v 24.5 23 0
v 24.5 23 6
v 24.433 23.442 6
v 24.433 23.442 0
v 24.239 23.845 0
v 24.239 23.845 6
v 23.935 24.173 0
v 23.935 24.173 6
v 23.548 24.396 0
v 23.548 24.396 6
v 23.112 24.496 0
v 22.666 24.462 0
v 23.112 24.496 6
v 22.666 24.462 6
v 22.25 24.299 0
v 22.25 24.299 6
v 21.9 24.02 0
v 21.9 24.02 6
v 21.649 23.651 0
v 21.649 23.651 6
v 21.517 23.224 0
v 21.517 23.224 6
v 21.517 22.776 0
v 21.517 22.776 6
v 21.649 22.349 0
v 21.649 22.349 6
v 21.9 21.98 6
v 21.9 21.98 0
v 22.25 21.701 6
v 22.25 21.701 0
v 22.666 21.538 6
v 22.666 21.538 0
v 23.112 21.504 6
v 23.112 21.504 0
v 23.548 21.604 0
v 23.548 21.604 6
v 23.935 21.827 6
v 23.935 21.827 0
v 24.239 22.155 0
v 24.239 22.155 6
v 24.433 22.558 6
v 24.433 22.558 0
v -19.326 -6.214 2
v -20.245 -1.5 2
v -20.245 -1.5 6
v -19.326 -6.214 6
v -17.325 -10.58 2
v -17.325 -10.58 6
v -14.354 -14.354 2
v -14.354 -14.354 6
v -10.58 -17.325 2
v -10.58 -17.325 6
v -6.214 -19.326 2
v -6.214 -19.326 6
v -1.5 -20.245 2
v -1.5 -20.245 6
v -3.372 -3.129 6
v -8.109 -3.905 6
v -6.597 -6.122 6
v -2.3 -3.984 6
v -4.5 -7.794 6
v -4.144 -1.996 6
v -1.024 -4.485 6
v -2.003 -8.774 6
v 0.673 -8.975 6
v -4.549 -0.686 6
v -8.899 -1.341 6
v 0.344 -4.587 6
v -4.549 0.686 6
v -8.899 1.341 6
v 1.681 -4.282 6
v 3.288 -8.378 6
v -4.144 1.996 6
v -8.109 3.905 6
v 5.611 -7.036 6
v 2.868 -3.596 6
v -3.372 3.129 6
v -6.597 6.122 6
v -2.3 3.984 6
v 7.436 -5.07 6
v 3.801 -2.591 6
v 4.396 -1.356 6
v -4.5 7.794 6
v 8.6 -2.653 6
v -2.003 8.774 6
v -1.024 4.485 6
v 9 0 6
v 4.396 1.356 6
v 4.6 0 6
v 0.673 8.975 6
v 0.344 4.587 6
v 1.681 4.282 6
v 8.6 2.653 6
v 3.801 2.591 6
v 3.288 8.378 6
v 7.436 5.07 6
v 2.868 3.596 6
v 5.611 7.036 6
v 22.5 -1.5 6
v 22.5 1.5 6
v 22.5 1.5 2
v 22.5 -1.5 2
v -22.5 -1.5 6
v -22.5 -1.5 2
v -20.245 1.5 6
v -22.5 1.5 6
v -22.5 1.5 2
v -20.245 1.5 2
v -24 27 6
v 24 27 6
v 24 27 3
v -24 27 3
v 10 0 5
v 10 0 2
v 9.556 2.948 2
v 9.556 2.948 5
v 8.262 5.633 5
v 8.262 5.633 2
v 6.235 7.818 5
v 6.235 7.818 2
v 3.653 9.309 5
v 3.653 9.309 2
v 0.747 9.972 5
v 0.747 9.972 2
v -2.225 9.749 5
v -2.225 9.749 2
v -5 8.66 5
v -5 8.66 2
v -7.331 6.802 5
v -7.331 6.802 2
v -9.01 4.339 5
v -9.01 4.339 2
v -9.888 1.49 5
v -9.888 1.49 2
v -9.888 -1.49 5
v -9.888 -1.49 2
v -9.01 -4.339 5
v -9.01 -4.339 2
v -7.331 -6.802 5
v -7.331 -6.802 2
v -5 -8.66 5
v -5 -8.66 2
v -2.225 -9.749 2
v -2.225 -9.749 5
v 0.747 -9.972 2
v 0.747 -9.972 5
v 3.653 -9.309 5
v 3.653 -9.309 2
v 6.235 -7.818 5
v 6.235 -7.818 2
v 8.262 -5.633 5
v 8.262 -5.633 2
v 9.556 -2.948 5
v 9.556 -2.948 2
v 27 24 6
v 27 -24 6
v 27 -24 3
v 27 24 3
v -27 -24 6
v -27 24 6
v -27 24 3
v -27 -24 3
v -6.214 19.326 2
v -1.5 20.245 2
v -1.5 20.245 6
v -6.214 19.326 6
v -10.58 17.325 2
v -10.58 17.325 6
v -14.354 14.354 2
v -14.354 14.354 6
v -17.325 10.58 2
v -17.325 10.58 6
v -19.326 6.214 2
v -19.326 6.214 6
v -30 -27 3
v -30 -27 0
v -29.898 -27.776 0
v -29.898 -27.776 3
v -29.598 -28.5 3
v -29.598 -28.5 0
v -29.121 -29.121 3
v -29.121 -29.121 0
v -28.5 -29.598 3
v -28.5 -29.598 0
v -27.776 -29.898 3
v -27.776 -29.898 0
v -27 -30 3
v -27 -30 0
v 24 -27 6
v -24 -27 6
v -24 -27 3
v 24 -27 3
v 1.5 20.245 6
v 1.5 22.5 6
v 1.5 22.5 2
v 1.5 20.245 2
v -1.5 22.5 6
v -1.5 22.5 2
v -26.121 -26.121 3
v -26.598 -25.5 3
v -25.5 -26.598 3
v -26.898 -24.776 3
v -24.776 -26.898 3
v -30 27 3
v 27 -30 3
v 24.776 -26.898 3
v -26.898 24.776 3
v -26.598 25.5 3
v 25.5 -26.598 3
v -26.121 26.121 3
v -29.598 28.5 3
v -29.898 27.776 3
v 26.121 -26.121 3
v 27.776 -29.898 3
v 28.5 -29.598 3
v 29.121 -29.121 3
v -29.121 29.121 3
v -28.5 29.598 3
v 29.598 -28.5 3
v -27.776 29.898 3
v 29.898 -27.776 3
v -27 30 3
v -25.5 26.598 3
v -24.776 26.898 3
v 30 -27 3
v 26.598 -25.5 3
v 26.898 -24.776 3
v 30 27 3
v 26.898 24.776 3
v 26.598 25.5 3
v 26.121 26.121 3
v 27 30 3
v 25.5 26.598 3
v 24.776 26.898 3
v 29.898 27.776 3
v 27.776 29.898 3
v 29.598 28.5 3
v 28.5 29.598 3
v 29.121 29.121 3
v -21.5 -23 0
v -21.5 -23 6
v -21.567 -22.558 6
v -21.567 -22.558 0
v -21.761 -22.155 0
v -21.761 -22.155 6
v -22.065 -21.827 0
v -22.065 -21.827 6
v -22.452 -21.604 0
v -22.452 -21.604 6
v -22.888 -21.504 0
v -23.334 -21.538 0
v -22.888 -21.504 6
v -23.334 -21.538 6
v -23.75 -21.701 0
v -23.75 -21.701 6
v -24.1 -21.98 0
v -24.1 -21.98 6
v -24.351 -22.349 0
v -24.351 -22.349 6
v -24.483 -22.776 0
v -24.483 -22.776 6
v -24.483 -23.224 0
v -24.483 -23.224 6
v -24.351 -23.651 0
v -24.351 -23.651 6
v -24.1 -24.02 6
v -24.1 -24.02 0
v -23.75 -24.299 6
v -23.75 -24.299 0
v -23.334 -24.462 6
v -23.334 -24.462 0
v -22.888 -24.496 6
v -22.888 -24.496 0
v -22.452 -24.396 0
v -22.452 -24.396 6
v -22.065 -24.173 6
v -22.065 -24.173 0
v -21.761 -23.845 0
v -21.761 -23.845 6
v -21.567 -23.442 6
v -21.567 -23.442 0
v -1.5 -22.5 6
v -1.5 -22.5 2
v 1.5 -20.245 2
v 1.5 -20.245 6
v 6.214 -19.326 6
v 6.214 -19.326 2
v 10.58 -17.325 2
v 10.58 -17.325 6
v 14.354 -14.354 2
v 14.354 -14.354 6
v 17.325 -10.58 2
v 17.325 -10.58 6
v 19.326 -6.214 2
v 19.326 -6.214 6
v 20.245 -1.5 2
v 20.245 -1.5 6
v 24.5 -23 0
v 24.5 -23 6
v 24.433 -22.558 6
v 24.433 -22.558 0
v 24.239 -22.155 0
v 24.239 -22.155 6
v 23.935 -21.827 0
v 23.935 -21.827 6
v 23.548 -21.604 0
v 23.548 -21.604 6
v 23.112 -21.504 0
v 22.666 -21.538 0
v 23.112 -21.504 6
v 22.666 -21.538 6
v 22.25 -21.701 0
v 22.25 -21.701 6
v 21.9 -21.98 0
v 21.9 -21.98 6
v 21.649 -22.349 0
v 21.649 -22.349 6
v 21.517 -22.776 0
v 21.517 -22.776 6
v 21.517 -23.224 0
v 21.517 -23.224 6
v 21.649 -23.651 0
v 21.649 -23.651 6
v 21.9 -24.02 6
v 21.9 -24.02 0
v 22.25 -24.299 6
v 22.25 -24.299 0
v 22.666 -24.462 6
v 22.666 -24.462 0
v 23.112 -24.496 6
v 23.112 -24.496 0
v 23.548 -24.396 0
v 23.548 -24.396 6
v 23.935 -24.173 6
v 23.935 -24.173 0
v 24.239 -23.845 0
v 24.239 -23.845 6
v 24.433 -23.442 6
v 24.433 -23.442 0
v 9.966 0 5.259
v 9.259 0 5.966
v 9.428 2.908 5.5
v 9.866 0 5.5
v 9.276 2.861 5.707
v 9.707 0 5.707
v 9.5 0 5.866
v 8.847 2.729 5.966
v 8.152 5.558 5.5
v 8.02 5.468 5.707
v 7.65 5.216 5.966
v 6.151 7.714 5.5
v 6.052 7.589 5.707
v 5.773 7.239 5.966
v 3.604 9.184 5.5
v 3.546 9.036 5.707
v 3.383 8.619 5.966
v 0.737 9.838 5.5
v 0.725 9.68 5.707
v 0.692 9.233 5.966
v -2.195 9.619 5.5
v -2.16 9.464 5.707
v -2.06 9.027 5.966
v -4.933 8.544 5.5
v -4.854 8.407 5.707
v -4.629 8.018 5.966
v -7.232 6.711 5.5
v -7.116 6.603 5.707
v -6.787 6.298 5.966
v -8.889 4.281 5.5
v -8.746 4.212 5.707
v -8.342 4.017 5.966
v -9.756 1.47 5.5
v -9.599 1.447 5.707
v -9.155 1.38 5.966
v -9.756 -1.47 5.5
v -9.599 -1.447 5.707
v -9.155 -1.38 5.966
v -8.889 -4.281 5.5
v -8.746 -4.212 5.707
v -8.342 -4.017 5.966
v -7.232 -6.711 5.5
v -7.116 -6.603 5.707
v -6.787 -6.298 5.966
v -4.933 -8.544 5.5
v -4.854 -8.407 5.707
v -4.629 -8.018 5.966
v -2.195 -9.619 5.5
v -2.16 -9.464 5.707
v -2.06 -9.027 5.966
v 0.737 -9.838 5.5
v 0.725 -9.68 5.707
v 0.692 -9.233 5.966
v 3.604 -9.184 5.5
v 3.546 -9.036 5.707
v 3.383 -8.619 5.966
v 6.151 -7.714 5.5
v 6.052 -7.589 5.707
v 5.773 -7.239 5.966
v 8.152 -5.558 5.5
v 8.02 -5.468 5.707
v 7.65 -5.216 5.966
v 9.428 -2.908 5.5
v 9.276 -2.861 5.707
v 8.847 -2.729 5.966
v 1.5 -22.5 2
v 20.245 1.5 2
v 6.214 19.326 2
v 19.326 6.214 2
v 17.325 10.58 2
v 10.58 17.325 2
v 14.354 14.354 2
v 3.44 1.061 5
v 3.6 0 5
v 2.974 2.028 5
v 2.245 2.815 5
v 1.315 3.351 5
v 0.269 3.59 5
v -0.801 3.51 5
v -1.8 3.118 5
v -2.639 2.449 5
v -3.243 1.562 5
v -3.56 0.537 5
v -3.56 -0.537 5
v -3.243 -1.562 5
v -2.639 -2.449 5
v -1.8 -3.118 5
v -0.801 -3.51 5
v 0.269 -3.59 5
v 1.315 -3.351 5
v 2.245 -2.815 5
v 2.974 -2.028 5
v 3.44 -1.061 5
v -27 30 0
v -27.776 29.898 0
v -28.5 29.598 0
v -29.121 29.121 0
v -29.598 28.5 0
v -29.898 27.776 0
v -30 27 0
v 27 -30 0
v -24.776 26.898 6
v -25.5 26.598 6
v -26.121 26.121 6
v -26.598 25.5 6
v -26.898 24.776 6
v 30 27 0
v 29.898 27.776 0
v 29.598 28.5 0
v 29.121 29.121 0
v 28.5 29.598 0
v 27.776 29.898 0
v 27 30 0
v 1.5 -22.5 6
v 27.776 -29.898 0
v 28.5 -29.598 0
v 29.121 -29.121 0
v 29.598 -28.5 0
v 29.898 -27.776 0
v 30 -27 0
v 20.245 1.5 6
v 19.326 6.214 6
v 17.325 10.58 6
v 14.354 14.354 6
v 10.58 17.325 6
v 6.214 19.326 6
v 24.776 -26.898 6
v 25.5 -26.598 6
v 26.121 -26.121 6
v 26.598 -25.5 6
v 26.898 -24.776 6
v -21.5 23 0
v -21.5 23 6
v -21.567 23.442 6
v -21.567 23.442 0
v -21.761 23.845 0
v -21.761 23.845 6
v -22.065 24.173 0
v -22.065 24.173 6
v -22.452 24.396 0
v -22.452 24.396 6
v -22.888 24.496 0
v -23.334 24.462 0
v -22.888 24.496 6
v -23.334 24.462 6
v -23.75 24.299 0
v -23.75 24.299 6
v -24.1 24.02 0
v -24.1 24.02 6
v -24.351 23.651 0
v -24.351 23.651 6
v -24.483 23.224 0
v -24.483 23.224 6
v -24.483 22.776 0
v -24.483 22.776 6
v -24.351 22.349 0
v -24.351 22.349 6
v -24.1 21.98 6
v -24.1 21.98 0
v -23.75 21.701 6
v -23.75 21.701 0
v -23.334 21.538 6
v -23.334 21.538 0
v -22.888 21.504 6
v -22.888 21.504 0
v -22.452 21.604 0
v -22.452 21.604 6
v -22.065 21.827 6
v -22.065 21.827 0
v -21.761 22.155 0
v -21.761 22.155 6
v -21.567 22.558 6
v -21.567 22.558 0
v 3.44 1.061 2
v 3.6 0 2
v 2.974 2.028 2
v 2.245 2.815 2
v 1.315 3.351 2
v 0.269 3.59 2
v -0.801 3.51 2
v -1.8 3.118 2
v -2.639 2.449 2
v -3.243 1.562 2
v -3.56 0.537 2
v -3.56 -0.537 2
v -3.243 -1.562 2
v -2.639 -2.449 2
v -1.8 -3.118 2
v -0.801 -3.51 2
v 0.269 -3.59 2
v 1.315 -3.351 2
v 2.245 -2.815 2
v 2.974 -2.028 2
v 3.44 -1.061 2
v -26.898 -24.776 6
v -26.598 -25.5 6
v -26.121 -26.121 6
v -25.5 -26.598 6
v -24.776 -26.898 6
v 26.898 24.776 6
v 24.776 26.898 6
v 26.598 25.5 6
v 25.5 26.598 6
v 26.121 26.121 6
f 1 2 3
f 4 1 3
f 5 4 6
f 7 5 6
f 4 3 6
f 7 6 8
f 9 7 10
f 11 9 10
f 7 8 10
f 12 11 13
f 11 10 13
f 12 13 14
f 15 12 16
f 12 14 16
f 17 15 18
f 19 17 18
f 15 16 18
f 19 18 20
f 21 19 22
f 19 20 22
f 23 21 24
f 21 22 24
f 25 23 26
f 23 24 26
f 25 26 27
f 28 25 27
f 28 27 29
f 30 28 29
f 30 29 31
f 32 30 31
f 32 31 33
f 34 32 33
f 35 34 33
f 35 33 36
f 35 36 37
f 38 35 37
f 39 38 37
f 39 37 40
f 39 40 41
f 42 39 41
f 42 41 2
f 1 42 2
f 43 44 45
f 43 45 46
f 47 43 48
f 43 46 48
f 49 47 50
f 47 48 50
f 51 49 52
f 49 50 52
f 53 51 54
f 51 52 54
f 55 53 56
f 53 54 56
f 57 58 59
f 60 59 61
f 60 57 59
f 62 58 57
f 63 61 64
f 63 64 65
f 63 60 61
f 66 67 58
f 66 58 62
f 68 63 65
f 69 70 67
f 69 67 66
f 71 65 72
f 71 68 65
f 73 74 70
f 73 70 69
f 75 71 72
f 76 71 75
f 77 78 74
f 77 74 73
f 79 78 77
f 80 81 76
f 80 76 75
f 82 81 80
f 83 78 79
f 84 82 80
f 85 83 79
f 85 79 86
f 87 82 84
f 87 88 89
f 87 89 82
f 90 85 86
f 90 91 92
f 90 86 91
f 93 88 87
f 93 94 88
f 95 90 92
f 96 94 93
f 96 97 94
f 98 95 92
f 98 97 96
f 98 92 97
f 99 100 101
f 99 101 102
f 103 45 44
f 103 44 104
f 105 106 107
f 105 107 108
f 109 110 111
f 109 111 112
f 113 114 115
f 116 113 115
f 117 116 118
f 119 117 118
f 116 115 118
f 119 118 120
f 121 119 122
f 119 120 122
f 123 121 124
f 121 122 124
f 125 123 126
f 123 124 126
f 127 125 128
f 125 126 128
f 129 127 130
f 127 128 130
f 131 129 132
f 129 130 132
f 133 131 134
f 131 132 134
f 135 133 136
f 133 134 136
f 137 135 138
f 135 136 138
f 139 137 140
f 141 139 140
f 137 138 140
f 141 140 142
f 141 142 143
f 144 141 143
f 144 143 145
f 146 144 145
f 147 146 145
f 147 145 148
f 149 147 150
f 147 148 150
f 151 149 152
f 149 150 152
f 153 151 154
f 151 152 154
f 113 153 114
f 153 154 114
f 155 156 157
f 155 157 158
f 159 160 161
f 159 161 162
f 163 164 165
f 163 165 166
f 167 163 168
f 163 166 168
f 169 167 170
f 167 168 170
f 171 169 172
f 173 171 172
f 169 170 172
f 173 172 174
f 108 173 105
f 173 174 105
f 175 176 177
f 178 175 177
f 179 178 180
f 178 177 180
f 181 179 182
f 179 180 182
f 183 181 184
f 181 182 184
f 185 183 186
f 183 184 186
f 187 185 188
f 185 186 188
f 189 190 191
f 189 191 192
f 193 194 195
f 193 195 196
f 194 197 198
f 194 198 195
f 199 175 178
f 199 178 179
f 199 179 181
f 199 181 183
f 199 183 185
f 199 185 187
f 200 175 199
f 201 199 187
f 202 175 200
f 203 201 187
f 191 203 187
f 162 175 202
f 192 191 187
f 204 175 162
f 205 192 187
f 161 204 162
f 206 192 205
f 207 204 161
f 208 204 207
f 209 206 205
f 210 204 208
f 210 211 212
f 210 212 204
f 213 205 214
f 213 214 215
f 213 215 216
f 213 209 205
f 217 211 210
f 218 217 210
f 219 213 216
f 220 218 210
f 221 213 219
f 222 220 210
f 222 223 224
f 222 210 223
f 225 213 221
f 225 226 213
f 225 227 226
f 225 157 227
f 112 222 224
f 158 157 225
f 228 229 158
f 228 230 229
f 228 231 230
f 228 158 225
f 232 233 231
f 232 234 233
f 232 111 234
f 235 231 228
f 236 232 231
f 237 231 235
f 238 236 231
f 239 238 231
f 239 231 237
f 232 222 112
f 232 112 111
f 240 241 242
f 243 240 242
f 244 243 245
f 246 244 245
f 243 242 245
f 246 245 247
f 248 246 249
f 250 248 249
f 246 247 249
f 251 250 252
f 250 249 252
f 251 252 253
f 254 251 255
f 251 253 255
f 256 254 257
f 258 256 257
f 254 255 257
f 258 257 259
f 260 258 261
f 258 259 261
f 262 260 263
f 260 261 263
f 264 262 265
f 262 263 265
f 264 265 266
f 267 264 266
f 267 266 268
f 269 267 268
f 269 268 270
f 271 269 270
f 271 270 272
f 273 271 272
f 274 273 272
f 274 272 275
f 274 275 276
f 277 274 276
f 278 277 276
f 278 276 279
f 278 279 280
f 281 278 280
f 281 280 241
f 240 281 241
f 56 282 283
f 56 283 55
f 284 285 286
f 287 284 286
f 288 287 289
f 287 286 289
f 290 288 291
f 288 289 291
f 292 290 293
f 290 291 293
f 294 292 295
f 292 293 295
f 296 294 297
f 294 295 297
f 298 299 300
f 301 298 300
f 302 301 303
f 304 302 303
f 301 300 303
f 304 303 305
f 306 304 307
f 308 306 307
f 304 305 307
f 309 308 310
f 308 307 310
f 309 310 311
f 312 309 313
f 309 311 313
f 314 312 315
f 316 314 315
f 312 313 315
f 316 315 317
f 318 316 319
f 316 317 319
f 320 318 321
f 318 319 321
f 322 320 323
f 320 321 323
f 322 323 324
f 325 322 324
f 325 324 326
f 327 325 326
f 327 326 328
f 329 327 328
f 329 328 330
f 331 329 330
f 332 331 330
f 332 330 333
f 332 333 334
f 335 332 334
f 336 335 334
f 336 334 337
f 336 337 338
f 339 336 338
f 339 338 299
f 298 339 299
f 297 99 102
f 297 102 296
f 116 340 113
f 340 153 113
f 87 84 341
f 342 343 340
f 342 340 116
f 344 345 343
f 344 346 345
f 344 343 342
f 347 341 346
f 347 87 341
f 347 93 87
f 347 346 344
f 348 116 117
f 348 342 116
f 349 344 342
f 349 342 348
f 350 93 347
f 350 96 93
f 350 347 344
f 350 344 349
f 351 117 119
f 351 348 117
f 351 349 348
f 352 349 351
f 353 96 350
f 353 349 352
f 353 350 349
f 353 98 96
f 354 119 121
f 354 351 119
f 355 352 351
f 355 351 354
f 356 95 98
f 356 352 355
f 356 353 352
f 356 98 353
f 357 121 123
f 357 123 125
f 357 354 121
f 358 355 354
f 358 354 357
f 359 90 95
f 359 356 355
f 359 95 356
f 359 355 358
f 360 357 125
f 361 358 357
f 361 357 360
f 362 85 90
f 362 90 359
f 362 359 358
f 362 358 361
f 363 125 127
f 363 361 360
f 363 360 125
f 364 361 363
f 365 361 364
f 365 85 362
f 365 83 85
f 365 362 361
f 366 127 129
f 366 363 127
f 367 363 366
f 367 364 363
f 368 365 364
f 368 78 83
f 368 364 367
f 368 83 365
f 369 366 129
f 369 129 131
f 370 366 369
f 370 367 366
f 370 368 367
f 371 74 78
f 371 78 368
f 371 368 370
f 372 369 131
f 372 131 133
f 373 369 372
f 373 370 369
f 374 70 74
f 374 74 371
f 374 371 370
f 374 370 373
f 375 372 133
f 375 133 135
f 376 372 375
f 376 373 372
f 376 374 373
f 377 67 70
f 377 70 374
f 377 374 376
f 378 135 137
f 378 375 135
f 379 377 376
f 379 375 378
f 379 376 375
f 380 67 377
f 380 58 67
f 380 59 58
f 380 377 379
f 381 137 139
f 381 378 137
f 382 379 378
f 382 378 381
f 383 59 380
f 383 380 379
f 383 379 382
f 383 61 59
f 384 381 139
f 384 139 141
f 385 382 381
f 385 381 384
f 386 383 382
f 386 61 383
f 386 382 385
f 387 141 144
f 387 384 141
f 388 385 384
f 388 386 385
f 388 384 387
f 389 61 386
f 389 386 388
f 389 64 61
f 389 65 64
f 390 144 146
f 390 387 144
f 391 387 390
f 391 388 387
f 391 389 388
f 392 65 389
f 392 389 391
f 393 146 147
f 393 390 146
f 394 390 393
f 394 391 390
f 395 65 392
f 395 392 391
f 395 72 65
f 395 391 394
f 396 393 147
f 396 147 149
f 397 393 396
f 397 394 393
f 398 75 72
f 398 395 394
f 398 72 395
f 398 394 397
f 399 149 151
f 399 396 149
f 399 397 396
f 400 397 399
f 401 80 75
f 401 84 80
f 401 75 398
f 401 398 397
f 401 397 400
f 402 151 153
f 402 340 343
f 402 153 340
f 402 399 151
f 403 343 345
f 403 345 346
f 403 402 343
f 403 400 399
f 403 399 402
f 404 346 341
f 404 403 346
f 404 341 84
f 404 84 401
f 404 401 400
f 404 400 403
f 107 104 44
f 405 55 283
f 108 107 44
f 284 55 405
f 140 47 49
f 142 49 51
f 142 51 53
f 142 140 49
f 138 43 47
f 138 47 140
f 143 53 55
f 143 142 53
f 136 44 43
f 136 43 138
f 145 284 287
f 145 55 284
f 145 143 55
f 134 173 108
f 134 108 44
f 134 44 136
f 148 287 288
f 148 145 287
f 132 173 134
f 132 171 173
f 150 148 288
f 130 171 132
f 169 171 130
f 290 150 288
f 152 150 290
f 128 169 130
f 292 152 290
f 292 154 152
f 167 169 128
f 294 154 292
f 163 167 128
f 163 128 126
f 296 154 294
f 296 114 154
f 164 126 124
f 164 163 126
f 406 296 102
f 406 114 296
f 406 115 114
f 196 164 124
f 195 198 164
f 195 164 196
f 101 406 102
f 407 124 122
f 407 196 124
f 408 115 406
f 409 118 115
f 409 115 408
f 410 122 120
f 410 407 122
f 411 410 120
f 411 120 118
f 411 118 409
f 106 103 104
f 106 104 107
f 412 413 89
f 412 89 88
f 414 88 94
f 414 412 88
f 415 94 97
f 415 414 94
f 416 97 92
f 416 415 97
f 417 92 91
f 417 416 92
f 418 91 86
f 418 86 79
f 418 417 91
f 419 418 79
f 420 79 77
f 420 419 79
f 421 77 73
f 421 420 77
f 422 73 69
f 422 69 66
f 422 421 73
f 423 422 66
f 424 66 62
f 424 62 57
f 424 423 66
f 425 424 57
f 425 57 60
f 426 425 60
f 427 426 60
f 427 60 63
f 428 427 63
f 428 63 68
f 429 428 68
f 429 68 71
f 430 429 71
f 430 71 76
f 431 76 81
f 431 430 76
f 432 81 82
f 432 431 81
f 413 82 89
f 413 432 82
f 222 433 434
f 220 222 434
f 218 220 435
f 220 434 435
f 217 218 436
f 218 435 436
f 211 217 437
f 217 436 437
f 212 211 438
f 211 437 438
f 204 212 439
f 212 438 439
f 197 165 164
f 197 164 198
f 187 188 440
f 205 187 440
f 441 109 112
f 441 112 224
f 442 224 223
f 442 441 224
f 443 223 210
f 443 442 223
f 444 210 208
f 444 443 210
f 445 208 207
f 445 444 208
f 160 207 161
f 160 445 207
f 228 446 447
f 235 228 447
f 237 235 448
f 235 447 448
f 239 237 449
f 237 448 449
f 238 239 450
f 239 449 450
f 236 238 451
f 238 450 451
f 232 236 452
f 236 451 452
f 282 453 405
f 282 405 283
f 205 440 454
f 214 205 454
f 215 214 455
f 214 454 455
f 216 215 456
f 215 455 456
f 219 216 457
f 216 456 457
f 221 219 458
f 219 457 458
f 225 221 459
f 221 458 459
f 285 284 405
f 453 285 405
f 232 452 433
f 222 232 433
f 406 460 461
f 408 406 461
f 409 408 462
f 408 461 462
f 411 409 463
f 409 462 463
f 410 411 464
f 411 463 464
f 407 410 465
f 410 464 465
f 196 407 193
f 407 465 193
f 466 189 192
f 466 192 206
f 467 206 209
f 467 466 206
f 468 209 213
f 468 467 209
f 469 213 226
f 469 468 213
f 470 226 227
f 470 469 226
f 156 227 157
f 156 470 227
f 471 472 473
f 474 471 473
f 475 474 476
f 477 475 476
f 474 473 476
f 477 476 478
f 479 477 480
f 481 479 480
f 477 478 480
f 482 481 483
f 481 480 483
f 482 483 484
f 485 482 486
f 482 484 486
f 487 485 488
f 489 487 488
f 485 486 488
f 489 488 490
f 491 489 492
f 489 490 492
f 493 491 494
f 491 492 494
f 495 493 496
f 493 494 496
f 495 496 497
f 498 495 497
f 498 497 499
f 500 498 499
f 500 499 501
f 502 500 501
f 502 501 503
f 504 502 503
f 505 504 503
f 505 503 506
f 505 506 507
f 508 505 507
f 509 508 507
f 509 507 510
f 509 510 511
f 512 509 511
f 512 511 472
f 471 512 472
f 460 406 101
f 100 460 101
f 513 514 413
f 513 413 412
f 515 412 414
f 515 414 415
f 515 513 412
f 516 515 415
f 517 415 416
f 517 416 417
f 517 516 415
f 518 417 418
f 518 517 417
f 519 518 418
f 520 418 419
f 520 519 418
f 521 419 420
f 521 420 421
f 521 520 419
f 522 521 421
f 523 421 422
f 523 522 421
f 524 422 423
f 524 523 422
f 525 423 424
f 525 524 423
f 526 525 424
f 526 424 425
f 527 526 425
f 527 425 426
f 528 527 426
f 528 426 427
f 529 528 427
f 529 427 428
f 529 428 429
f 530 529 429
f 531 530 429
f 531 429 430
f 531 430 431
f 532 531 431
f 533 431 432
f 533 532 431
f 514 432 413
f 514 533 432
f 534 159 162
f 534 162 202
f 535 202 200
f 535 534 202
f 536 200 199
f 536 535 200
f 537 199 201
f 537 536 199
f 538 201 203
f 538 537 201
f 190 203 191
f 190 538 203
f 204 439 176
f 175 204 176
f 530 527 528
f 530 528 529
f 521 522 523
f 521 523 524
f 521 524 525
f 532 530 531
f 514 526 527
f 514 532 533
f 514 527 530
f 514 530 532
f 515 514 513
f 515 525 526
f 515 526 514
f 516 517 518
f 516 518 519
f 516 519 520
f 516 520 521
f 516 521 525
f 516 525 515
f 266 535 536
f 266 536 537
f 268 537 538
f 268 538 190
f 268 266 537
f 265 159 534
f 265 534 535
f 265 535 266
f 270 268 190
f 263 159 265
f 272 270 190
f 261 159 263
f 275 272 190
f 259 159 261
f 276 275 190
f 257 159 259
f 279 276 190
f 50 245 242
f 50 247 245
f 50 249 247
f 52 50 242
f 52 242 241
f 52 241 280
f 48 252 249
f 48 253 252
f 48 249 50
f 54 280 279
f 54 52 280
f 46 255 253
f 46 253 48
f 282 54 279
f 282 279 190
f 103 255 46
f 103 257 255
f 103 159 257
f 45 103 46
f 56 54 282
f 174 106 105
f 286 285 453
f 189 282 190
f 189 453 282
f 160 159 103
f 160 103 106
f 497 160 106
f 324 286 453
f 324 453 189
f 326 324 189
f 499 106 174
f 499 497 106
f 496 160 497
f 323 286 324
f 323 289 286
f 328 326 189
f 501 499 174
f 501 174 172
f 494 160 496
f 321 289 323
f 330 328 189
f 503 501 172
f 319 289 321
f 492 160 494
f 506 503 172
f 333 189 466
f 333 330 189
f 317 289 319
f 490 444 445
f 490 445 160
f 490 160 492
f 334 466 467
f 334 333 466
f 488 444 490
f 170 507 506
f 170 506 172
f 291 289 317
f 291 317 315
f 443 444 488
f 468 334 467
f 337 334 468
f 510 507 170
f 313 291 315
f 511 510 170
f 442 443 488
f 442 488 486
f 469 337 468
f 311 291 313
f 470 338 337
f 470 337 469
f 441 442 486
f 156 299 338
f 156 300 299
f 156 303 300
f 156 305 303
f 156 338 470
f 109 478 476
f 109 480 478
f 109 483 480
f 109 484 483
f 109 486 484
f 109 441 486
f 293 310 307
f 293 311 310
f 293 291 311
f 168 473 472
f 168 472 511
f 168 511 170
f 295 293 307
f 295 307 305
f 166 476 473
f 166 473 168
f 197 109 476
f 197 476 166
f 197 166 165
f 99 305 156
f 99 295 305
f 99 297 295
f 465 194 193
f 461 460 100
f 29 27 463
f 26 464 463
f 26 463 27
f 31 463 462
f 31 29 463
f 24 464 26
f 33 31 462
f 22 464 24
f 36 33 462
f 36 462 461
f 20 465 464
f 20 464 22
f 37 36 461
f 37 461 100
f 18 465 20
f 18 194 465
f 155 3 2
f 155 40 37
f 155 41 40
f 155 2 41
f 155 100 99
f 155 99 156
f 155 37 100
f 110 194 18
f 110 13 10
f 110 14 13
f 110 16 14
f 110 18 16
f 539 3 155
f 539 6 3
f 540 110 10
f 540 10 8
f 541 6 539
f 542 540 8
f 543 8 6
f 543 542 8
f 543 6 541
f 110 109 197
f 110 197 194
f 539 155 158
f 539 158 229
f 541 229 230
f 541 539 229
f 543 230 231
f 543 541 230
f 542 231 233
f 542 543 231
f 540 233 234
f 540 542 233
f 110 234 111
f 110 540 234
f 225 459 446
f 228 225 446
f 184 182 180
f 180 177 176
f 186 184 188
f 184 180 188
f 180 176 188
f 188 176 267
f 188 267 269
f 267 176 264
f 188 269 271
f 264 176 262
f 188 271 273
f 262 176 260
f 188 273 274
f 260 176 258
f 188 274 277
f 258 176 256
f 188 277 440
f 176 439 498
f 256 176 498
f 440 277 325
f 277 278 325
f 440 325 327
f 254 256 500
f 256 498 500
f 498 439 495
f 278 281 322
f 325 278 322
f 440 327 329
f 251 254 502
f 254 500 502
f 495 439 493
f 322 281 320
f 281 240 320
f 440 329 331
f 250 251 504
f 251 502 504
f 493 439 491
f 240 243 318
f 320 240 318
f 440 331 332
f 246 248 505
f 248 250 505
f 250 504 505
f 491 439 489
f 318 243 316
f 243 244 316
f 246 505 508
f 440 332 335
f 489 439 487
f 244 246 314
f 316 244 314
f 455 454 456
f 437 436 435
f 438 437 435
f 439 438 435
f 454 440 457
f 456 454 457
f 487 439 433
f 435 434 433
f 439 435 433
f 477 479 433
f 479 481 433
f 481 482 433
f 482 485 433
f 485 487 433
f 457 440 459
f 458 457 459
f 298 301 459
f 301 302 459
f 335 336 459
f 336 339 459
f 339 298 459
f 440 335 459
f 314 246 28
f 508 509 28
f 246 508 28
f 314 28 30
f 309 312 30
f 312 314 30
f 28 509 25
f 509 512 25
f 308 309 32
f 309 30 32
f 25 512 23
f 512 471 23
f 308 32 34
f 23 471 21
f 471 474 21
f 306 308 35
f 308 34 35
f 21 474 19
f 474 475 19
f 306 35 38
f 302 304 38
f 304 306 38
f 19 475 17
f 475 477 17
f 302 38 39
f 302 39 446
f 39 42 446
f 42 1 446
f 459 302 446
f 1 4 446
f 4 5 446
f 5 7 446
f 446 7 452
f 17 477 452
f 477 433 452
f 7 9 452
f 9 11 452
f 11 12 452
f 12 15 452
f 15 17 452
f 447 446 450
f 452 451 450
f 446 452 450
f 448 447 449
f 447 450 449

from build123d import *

# Parameters (mm, degrees)
PAD_DEPTH       = 6
SKETCH001_R     = 20.3
POCKET_DEPTH    = 4
POCKET001_DEPTH = 4
POCKET002_DEPTH = 3
SKETCH004_R     = 1.5
POCKET003_DEPTH = 6.001
SKETCH005_R     = 10
SKETCH005_R_2   = 3.6
PAD001_DEPTH    = 4
FILLET_R        = 1
CHAMFER_SIZE    = 1


with BuildPart() as part:
    # Sketch → Pad (new body)
    with BuildSketch(Plane.XY):
        with BuildLine():
            Line((-30, 27), (-30, -27))
            ThreePointArc((-30, -27), (-29.12132, -29.12132), (-27, -30))
            Line((-27, -30), (27, -30))
            ThreePointArc((27, -30), (29.12132, -29.12132), (30, -27))
            Line((30, -27), (30, 27))
            ThreePointArc((30, 27), (29.12132, 29.12132), (27, 30))
            Line((27, 30), (-27, 30))
            ThreePointArc((-27, 30), (-29.12132, 29.12132), (-30, 27))
        make_face()
    extrude(amount=PAD_DEPTH)

    # Sketch001 (on Face10 of Pad) → Pocket (cut)
    with BuildSketch(Plane.XY.offset(6)):
        Circle(SKETCH001_R)
    extrude(amount=-POCKET_DEPTH, mode=Mode.SUBTRACT)

    # Sketch002 (on Face5 of Pocket) → Pocket001 (cut)
    with BuildSketch(Plane.XY.offset(6)):
        Polygon((-22.5, 1.5), (-1.5, 1.5), (-1.5, 22.5), (1.5, 22.5), (1.5, 1.5), (22.5, 1.5), (22.5, -1.5), (1.5, -1.5), (1.5, -22.5), (-1.5, -22.5), (-1.5, -1.5), (-22.5, -1.5), align=None)
    extrude(amount=-POCKET001_DEPTH, mode=Mode.SUBTRACT)

    # Sketch003 (on Face5 of Pocket001) → Pocket002 (cut)
    with BuildSketch(Plane.XY.offset(6)):
        with BuildLine():
            Line((-30, 27), (-30, -27))
            ThreePointArc((-30, -27), (-29.12132, -29.12132), (-27, -30))
            Line((-27, -30), (27, -30))
            ThreePointArc((27, -30), (29.12132, -29.12132), (30, -27))
            Line((30, -27), (30, 27))
            ThreePointArc((30, 27), (29.12132, 29.12132), (27, 30))
            Line((27, 30), (-27, 30))
            ThreePointArc((-27, 30), (-29.12132, 29.12132), (-30, 27))
        make_face()
        with BuildLine():
            Line((-27, 24), (-27, -24))
            ThreePointArc((-27, -24), (-26.12132, -26.12132), (-24, -27))
            Line((-24, -27), (24, -27))
            ThreePointArc((24, -27), (26.12132, -26.12132), (27, -24))
            Line((27, -24), (27, 24))
            ThreePointArc((27, 24), (26.12132, 26.12132), (24, 27))
            Line((24, 27), (-24, 27))
            ThreePointArc((-24, 27), (-26.12132, 26.12132), (-27, 24))
        make_face(mode=Mode.SUBTRACT)
    extrude(amount=-POCKET002_DEPTH, mode=Mode.SUBTRACT)

    # Sketch004 (on Face19 of Pocket002) → Pocket003 (cut, through all)
    with BuildSketch(Plane.XY.offset(6)):
        with Locations((-23, 23)):
            Circle(SKETCH004_R)
        with Locations((-23, -23)):
            Circle(SKETCH004_R)
        with Locations((23, -23)):
            Circle(SKETCH004_R)
        with Locations((23, 23)):
            Circle(SKETCH004_R)
    extrude(amount=-POCKET003_DEPTH, mode=Mode.SUBTRACT)

    # Sketch005 (on Face40 of Pocket003) → Pad001 (join)
    with BuildSketch(Plane.XY.offset(2)):
        Circle(SKETCH005_R)
        Circle(SKETCH005_R_2, mode=Mode.SUBTRACT)
    extrude(amount=PAD001_DEPTH)

    # Fillet
    fillet_edges = [part.edges().sort_by_distance(p)[0] for p in [
        (-10, 0, 6),
    ]]
    fillet(fillet_edges, radius=FILLET_R)

    # Chamfer
    chamfer_edges = [part.edges().sort_by_distance(p)[0] for p in [
        (-3.6, 0, 6),
    ]]
    chamfer(chamfer_edges, length=CHAMFER_SIZE)


solid = part.part
